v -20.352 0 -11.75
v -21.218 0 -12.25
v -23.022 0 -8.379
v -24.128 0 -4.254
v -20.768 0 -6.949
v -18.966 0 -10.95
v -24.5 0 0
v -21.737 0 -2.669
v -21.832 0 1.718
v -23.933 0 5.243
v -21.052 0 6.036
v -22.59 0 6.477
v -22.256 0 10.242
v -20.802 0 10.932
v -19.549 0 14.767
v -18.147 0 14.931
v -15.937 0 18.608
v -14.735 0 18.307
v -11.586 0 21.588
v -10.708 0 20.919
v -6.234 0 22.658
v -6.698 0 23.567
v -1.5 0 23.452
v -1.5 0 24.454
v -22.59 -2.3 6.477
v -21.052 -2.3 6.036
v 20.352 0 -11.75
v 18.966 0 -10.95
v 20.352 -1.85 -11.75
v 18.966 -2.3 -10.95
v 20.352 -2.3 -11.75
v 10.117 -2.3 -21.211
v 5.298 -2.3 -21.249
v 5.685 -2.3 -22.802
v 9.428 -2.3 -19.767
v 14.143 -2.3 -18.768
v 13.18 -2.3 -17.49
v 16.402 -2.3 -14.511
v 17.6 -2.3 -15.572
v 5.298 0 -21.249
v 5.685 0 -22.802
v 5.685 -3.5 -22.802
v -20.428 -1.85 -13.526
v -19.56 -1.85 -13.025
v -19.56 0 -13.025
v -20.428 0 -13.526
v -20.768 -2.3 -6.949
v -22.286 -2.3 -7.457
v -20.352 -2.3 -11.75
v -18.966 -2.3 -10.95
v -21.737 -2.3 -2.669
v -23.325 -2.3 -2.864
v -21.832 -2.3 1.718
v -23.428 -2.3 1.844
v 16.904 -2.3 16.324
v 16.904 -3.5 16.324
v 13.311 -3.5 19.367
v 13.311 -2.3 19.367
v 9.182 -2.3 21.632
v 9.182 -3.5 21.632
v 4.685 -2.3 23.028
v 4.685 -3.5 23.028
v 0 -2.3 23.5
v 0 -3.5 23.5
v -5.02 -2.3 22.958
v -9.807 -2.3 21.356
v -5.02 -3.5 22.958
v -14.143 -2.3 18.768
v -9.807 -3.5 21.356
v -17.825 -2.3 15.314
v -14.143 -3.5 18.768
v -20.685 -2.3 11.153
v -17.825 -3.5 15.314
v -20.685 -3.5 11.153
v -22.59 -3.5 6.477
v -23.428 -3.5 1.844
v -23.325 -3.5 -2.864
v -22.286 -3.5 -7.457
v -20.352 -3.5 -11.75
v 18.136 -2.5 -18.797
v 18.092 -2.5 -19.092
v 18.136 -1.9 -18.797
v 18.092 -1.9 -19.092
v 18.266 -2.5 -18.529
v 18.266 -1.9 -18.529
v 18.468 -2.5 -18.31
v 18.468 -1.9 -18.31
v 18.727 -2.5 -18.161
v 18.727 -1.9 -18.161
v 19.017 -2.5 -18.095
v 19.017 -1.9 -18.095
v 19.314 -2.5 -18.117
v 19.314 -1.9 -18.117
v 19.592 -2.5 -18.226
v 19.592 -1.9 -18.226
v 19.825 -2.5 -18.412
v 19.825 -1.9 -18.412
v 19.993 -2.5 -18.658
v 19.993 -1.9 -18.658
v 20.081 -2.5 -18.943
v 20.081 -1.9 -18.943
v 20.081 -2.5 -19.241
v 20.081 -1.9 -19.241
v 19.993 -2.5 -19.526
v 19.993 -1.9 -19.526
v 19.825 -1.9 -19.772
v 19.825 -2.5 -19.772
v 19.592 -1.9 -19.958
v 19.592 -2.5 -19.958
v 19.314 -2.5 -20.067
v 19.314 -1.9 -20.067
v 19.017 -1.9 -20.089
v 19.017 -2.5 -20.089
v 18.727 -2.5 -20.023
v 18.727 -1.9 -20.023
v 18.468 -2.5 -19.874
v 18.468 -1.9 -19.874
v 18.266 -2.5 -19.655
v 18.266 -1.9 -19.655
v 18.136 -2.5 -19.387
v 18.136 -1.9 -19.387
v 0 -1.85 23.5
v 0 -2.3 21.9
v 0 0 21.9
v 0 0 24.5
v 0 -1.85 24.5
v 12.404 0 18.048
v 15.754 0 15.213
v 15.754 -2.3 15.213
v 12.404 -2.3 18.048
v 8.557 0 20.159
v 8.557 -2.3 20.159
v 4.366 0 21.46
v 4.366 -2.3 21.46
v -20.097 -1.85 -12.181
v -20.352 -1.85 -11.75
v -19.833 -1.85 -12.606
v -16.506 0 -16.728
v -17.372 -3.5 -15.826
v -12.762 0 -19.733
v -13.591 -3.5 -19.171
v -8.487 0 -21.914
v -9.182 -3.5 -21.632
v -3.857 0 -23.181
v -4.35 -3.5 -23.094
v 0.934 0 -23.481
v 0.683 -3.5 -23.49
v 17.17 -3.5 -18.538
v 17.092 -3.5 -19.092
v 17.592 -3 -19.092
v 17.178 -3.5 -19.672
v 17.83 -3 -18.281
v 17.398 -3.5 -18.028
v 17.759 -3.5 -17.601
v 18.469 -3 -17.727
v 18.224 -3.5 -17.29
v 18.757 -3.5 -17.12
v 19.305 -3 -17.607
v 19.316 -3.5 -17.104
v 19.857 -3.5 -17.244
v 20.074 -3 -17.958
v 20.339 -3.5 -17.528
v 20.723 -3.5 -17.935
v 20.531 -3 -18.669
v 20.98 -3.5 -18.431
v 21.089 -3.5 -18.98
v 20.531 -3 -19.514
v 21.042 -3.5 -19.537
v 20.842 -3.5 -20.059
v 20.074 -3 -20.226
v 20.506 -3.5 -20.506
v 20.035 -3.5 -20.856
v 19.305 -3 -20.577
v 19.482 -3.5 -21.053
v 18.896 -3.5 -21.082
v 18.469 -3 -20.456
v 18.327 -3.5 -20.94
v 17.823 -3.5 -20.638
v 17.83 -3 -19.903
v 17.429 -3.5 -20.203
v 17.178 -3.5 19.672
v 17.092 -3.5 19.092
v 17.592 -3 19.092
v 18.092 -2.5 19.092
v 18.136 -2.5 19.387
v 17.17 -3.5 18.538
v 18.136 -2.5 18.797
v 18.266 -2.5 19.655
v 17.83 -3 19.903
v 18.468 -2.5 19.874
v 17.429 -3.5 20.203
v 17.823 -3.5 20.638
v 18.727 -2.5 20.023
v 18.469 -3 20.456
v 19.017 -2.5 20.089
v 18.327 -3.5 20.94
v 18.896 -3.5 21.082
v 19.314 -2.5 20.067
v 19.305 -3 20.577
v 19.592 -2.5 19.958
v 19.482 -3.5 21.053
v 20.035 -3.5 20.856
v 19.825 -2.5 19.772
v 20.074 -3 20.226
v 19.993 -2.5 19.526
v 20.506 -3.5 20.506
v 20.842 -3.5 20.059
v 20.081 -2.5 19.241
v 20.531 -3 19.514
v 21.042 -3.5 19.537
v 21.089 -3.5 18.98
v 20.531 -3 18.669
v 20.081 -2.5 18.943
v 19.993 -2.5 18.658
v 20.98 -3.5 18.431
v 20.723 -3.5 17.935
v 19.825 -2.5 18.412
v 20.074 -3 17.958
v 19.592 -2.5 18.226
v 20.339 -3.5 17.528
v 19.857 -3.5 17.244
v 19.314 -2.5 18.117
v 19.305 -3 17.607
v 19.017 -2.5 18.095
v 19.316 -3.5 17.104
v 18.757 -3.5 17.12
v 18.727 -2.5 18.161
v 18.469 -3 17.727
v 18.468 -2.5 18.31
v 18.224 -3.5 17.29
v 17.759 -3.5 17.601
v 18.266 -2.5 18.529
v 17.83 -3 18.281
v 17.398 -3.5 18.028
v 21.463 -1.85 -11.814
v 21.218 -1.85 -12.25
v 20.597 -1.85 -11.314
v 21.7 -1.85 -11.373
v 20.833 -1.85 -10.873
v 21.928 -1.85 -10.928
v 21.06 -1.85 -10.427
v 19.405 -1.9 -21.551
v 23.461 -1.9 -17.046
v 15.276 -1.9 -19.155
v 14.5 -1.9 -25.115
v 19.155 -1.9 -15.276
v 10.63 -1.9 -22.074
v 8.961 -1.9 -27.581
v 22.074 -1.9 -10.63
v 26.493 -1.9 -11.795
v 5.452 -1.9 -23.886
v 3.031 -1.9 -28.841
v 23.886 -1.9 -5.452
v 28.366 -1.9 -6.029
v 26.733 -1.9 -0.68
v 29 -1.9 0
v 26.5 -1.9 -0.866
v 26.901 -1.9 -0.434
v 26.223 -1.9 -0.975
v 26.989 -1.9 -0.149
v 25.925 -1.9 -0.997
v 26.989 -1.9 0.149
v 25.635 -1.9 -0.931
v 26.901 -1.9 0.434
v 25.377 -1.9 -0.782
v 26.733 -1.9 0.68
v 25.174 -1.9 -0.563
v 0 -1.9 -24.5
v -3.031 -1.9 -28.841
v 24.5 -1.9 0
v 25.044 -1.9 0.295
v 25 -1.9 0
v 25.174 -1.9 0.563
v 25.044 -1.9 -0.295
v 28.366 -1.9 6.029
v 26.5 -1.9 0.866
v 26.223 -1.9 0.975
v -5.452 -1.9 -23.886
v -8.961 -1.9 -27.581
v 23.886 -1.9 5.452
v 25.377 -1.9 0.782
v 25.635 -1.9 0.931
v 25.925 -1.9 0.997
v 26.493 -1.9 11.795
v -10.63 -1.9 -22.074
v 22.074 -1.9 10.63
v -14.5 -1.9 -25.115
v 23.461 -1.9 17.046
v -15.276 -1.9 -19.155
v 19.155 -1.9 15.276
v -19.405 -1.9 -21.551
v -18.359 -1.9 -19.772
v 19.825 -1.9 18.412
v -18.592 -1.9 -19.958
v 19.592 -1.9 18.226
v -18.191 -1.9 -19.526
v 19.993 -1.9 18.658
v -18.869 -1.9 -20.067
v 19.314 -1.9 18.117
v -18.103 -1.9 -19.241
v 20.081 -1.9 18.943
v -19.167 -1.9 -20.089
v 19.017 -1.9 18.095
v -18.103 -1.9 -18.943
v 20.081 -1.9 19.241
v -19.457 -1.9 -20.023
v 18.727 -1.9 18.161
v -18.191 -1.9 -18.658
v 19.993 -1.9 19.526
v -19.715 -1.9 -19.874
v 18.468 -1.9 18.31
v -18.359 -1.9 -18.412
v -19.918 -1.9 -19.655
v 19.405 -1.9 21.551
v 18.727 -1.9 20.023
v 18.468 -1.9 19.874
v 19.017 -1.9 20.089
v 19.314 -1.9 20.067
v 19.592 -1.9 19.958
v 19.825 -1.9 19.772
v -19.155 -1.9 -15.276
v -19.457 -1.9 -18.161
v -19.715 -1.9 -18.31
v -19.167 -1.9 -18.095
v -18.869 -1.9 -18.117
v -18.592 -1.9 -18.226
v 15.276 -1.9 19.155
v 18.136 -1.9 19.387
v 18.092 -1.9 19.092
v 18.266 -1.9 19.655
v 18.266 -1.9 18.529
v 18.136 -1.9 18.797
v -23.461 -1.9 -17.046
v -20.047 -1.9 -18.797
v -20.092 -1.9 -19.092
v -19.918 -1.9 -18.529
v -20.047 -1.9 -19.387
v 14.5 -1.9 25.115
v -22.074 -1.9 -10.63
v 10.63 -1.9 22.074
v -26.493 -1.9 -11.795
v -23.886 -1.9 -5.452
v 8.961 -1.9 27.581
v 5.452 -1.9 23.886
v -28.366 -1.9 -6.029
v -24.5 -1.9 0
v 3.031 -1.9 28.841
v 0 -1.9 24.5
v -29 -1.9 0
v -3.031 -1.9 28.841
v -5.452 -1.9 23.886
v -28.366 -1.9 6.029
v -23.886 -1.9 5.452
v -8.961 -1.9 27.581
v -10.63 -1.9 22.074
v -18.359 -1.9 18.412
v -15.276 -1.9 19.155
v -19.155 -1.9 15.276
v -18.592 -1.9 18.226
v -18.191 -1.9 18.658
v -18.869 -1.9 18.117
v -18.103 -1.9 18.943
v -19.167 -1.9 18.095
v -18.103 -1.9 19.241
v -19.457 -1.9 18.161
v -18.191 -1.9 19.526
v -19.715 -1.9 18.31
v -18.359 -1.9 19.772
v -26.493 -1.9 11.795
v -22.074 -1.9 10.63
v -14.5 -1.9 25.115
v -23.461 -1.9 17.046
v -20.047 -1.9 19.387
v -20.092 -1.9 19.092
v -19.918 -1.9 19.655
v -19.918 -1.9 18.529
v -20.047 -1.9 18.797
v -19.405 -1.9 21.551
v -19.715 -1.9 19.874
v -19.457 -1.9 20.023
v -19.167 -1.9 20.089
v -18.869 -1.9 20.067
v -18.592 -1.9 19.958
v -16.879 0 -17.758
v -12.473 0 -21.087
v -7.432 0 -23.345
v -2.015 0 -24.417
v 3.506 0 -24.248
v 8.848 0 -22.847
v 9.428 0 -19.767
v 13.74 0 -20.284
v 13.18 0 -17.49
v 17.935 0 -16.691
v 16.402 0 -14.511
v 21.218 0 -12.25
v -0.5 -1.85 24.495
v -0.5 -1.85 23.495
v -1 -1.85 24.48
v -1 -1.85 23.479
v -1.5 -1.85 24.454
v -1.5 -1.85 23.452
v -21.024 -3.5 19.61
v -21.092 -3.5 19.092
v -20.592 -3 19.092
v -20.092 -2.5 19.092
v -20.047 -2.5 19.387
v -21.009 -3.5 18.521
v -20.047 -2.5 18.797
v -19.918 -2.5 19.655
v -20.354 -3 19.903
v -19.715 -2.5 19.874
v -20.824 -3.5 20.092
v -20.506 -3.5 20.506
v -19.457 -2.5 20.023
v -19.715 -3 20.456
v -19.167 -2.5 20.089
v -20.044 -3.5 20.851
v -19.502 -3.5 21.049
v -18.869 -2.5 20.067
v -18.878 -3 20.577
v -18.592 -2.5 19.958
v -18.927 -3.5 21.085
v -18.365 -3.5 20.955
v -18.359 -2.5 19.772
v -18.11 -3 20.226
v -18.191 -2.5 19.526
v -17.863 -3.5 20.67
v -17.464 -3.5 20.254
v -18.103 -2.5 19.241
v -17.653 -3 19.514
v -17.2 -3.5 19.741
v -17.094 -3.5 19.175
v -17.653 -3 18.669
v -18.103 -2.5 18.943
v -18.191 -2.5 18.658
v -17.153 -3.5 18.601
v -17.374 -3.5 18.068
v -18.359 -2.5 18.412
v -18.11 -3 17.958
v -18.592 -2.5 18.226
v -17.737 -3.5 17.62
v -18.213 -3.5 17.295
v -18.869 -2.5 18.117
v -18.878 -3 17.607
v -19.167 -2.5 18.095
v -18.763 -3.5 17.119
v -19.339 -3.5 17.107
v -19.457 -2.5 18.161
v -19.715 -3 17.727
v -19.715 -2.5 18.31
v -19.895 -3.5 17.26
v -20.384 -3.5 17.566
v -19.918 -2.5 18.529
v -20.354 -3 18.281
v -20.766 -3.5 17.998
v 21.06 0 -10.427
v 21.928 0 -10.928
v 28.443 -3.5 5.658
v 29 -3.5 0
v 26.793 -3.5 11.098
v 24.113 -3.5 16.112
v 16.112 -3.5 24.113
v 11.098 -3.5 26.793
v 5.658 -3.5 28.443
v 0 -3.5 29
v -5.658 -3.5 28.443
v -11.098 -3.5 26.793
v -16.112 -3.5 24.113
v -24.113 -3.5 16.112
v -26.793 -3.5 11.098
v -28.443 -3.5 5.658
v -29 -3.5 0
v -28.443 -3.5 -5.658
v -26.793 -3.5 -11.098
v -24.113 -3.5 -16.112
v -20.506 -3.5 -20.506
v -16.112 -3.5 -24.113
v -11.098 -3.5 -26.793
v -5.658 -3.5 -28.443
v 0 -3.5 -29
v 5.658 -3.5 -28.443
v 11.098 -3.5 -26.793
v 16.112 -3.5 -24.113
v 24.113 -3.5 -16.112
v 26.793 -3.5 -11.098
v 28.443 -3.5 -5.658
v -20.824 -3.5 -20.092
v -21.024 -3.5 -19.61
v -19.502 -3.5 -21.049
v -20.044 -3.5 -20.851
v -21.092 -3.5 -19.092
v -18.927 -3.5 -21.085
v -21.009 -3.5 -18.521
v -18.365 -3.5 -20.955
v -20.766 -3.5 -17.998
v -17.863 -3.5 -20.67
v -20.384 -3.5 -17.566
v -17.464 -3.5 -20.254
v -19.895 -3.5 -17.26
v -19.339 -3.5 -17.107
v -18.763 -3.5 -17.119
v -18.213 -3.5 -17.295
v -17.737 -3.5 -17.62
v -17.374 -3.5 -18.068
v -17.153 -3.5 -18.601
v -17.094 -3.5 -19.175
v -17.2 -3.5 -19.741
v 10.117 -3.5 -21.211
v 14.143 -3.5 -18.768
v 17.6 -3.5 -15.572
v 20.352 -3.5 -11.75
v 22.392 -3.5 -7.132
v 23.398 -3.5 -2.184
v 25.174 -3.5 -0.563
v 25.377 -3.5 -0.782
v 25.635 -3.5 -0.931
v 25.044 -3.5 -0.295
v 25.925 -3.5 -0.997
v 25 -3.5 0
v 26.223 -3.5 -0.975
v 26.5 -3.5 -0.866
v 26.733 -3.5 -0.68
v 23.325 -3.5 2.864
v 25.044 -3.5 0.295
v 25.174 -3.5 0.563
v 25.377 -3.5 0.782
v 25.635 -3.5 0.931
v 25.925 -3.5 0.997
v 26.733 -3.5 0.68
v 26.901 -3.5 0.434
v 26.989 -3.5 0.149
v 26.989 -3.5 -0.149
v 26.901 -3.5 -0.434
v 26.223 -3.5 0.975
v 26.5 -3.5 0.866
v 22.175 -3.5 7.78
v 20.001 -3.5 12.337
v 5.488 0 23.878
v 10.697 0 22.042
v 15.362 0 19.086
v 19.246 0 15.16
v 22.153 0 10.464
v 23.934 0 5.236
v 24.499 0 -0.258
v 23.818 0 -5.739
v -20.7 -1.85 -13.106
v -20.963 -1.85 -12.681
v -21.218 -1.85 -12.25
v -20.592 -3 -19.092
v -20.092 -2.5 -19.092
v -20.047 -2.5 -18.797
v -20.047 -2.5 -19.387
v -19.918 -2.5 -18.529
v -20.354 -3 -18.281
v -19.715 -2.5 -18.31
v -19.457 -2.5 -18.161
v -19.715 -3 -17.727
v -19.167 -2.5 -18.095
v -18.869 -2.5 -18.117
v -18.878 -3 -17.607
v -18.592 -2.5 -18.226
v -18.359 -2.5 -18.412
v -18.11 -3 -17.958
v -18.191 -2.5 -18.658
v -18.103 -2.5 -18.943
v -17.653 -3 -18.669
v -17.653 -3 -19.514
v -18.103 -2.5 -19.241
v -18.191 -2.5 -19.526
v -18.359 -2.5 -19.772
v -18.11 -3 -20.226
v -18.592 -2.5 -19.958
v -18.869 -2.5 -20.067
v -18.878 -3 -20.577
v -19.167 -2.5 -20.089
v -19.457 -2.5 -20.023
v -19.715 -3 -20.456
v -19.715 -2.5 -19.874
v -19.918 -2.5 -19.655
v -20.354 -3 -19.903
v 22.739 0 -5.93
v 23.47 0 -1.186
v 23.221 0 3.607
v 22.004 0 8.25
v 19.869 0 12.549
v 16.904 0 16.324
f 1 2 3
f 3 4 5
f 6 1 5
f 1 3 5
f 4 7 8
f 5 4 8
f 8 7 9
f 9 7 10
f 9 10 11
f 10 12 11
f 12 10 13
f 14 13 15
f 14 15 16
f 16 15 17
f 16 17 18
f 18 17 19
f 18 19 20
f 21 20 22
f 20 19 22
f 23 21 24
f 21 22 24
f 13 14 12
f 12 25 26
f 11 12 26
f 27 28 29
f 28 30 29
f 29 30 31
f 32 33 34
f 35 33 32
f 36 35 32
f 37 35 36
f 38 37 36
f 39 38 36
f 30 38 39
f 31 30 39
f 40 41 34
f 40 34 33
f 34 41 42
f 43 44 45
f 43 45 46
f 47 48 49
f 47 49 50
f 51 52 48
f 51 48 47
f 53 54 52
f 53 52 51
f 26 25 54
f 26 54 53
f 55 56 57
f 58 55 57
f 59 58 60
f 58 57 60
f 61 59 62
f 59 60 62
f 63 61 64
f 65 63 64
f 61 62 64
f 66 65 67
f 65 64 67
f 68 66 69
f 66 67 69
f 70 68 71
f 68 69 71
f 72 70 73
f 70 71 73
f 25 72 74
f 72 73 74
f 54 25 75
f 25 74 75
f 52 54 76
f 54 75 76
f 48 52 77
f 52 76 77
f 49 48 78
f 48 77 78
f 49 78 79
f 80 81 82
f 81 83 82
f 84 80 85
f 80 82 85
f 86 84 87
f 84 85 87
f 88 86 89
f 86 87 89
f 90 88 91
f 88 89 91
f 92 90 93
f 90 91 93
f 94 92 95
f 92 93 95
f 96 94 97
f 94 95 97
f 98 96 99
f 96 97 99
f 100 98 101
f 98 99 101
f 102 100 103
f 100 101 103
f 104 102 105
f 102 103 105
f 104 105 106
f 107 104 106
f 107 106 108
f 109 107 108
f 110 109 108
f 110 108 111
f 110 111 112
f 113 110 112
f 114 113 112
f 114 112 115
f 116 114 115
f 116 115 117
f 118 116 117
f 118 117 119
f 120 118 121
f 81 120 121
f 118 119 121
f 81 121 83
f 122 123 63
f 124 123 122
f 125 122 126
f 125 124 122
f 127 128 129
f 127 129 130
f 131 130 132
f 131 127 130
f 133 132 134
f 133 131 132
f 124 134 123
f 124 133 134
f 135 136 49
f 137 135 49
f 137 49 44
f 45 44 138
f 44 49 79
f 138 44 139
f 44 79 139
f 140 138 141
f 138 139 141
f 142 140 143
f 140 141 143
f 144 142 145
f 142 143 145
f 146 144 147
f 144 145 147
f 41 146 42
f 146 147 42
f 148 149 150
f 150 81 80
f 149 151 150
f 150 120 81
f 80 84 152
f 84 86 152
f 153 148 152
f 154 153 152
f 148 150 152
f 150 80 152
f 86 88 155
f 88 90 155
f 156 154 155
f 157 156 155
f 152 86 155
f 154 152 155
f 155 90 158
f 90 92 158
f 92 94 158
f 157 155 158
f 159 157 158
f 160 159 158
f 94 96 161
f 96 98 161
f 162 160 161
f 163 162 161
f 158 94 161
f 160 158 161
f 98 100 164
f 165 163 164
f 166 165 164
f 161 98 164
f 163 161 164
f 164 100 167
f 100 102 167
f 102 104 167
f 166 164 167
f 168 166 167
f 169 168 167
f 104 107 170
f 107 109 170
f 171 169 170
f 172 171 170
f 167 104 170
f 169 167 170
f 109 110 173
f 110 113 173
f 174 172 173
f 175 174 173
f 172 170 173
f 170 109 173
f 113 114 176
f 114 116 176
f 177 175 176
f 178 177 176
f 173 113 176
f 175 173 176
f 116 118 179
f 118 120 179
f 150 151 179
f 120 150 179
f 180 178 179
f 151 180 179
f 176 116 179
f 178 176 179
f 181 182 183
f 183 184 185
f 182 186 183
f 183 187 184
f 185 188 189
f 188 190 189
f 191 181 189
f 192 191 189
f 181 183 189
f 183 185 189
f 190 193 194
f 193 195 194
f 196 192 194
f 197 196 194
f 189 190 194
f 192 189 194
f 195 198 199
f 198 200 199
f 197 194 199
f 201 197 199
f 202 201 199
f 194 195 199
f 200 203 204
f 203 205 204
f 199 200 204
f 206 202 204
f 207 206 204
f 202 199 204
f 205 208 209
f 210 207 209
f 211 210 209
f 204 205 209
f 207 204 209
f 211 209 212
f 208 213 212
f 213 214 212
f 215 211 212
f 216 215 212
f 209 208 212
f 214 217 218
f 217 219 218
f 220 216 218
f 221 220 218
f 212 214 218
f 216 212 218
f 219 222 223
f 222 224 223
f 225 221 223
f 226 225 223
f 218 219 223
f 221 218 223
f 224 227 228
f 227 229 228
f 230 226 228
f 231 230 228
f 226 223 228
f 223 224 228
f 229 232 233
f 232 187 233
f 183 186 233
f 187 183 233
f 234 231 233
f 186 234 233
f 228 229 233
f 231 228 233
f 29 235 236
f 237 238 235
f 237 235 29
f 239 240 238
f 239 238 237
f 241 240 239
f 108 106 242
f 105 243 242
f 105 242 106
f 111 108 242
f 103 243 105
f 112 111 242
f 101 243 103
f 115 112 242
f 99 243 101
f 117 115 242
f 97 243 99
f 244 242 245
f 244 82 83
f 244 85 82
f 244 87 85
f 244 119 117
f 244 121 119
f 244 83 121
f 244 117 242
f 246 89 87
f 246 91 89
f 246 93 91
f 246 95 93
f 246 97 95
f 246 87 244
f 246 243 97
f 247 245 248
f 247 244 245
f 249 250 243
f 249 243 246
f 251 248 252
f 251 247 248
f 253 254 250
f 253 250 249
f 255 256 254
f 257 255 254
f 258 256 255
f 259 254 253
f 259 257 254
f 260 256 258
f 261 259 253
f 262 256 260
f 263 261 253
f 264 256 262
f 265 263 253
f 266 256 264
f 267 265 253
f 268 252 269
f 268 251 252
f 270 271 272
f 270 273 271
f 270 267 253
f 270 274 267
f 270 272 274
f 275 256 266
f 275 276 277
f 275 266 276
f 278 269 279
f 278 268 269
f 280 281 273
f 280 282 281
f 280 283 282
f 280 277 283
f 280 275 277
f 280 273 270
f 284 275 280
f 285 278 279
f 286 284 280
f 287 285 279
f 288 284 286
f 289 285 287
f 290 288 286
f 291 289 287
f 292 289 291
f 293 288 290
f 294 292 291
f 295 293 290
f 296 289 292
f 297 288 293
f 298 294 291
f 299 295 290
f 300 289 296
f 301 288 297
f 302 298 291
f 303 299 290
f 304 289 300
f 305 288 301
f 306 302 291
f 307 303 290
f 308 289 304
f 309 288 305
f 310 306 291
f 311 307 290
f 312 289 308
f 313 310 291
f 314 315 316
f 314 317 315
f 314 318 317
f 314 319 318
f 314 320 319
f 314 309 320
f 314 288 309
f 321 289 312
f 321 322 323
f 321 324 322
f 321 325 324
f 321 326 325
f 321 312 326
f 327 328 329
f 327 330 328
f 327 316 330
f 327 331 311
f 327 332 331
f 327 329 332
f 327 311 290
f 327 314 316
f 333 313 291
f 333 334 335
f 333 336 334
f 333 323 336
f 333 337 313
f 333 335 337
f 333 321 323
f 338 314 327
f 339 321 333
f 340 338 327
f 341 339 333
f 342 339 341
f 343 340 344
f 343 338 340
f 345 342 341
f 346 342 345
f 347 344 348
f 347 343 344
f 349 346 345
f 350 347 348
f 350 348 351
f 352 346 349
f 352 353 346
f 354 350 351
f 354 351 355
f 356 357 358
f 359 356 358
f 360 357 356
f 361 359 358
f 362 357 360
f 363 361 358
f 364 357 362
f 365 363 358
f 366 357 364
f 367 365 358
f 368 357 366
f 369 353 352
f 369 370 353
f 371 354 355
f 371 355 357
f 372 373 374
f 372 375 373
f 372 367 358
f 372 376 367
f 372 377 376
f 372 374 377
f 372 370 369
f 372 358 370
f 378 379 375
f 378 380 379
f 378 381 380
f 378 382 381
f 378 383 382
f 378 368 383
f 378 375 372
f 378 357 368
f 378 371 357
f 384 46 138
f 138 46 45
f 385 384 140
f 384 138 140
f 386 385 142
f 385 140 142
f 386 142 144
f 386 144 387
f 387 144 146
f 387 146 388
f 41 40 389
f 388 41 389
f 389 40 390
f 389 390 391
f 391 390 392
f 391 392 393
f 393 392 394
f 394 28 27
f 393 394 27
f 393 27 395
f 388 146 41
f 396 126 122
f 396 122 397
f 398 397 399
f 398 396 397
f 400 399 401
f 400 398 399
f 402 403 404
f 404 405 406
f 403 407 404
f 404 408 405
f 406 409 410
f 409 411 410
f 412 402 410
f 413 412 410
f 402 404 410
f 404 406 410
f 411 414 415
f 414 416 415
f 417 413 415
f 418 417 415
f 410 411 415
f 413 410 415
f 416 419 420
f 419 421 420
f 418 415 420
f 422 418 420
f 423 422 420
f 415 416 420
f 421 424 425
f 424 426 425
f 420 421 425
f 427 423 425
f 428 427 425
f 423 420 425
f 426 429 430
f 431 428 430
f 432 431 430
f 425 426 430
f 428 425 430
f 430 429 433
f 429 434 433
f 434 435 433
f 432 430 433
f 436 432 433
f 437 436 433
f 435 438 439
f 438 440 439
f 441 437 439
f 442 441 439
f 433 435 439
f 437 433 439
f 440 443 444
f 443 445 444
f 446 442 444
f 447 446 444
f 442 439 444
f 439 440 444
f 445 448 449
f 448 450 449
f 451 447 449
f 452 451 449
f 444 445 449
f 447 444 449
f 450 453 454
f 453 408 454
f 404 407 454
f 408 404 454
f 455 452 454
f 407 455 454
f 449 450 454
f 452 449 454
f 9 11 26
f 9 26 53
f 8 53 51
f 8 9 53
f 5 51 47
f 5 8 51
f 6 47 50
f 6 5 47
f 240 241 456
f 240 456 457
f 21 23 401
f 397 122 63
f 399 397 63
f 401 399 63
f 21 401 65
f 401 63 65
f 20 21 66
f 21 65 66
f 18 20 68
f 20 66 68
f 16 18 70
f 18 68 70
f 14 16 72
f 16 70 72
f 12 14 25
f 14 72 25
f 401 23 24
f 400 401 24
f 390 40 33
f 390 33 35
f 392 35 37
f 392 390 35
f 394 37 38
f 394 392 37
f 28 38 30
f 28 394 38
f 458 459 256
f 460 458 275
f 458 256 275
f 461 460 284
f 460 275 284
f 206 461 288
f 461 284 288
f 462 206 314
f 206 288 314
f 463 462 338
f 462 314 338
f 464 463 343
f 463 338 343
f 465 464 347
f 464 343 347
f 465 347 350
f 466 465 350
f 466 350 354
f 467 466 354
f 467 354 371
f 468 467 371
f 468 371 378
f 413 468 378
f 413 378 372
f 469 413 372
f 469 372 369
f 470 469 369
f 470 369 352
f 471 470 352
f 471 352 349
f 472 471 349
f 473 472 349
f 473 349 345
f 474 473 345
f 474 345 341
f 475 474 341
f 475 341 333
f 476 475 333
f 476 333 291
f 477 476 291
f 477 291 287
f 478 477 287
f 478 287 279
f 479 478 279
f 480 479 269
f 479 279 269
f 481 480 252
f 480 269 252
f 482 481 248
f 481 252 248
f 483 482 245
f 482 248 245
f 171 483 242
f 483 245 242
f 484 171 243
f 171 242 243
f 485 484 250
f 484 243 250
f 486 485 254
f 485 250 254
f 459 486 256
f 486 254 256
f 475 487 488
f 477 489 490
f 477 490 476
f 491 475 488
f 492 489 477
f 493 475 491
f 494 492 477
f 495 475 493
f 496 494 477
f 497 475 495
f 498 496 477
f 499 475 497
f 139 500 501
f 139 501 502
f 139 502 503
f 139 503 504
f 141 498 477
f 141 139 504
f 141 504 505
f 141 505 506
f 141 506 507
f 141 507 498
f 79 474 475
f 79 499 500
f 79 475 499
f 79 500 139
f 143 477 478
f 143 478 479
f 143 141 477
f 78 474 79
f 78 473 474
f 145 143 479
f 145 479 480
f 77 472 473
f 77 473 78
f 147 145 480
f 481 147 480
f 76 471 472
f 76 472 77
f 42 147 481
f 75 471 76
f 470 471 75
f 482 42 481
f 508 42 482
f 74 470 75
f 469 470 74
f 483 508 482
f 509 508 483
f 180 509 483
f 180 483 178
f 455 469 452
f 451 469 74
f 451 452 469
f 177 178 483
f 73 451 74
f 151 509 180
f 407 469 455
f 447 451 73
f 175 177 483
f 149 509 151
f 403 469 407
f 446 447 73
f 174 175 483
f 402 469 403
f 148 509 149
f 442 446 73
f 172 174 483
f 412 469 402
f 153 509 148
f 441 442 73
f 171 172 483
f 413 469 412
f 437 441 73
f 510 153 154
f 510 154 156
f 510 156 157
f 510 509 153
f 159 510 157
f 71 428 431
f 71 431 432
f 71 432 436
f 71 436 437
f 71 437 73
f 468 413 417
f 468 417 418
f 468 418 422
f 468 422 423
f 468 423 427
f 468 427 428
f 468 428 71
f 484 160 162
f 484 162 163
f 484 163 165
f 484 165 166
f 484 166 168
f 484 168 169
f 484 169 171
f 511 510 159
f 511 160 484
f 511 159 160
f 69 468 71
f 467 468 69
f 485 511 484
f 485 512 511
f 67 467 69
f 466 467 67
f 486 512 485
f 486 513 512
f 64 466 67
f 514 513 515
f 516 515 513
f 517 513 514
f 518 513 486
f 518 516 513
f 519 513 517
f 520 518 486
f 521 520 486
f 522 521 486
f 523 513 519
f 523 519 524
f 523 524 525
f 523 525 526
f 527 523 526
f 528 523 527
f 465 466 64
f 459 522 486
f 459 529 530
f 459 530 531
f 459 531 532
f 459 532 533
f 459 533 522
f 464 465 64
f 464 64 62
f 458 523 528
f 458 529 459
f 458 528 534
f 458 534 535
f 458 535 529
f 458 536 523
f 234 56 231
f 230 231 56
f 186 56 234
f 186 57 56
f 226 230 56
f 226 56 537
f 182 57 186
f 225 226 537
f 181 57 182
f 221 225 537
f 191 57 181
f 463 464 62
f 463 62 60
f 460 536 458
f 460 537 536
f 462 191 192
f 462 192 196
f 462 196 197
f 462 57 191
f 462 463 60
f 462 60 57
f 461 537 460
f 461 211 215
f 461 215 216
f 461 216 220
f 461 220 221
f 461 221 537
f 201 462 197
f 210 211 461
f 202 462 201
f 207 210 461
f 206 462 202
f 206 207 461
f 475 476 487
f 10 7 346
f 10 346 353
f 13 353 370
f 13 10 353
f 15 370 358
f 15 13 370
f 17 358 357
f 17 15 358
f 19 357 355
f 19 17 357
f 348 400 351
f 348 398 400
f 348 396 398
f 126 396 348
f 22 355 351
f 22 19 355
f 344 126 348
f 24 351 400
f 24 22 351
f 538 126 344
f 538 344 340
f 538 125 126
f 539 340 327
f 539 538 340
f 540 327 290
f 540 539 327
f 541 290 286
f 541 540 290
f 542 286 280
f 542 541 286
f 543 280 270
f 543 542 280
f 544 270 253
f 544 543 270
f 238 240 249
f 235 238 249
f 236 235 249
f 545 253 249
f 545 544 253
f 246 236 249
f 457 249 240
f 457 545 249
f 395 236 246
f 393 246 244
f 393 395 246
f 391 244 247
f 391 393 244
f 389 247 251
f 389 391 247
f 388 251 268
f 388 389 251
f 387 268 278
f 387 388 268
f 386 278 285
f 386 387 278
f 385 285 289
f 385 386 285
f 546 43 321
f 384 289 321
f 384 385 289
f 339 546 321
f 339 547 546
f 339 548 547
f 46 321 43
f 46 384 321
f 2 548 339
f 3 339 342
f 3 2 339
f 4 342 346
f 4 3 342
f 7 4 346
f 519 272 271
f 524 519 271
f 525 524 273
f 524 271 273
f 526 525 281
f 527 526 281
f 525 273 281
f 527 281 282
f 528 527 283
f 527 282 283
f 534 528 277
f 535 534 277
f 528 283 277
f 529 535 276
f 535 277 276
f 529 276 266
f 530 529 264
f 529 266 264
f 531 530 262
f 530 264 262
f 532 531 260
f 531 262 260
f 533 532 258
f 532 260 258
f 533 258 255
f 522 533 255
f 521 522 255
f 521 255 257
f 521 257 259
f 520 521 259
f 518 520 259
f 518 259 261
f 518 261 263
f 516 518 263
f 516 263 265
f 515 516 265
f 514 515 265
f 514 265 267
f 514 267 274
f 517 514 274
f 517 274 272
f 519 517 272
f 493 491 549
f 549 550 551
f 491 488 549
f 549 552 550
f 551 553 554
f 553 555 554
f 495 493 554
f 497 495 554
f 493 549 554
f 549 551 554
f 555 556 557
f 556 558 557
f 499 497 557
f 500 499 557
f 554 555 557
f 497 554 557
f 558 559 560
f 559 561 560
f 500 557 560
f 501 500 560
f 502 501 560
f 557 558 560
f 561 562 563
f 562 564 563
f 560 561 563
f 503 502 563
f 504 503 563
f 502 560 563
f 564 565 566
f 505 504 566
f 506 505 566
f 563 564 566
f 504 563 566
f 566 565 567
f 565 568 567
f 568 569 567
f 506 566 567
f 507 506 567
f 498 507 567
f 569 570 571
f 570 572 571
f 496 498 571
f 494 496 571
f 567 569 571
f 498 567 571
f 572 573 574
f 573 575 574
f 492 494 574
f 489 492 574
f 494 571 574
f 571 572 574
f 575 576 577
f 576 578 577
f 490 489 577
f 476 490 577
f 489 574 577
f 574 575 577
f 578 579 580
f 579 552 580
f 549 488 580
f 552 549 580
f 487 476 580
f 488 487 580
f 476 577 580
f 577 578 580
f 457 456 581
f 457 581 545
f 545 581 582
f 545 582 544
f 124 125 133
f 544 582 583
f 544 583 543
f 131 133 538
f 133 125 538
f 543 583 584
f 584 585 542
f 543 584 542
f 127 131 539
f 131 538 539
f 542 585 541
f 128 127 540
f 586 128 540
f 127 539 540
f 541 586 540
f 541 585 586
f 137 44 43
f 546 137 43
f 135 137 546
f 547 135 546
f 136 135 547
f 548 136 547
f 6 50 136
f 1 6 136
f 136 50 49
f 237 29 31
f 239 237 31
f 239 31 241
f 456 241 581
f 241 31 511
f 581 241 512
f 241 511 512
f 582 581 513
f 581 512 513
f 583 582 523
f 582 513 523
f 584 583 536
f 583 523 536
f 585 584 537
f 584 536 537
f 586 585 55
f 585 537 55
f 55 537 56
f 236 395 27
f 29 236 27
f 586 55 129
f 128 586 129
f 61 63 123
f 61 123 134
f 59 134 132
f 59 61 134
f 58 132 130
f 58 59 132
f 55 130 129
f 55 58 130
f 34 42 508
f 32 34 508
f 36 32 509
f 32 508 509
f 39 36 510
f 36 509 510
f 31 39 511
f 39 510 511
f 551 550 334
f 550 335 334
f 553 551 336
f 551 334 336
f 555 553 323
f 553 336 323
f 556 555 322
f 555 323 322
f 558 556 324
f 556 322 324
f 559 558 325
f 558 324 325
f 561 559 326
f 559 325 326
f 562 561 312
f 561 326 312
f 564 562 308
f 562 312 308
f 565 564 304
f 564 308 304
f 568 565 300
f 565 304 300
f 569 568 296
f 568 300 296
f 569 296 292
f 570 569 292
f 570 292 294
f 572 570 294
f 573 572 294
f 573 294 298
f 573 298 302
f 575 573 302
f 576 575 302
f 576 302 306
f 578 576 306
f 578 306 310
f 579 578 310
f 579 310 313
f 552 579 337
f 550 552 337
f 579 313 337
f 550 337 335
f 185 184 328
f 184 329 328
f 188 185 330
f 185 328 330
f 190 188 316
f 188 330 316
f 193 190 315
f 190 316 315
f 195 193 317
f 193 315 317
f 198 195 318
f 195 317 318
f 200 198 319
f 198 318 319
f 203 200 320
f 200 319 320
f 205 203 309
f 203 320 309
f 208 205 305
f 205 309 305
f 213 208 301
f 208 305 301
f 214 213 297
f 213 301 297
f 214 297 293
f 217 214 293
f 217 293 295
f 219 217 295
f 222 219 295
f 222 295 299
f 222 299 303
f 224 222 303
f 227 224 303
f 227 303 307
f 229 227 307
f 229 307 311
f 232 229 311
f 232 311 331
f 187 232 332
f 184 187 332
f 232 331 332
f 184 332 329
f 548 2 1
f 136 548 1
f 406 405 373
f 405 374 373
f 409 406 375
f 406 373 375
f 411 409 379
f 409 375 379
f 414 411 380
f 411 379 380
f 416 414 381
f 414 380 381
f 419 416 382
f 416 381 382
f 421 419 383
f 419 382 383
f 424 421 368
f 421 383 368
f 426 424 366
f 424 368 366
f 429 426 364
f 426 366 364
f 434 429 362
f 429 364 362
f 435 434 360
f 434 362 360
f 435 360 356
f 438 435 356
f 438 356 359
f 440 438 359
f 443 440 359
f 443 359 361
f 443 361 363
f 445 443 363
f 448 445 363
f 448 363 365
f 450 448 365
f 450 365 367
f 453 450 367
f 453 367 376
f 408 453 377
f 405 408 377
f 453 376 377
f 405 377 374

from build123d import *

# Parameters (mm, degrees)
F0_R            = 29
F0_R_2          = 21.9
F1_DEPTH        = 3.5
F2_R            = 23.5
F3_DEPTH        = 1.2
F5_DEPTH        = 3.501
F6_R            = 30.5
F6_R_2          = 24.5
F7_DEPTH        = 1.9
F8_W            = 1.5
F8_H            = 25
F9_DEPTH        = 1.85
F11_D           = 2
F13_D           = 2
F13_DEPTH       = 10
F13_CSINK_D     = 4
F13_CSINK_ANGLE = 90


with BuildPart() as f1:
    # F0 (on Front) → F1 (new body)
    with BuildSketch(Plane.XZ):
        Circle(F0_R)
        Circle(F0_R_2, mode=Mode.SUBTRACT)
    extrude(amount=F1_DEPTH)

    # F2 (on face) → F3 (cut)
    with BuildSketch(Plane.XZ.offset(3.5)):
        Circle(F2_R)
    extrude(amount=-F3_DEPTH, mode=Mode.SUBTRACT)

    # F4 (on face) → F5 (cut, through all)
    with BuildSketch(Plane.XZ.offset(3.5)):
        with BuildLine():
            Line((0, 21.9), (0, 23.5))
            ThreePointArc((0, 23.5), (-14.142653, 18.767934), (-22.58965, 6.477478))
            Line((-22.58965, 6.477478), (-21.051631, 6.036458))
            ThreePointArc((-21.051631, 6.036458), (-21.736761, -2.668939), (-18.965956, -10.95))
            Line((-18.965956, -10.95), (-20.351597, -11.75))
            ThreePointArc((-20.351597, -11.75), (-9.182182, -21.631864), (5.685165, -22.80195))
            Line((5.685165, -22.80195), (5.29809, -21.249476))
            ThreePointArc((5.29809, -21.249476), (13.179749, -17.490118), (18.965956, -10.95))
            Line((18.965956, -10.95), (20.351597, -11.75))
            ThreePointArc((20.351597, -11.75), (23.324835, 2.86393), (16.904485, 16.324472))
            Line((16.904485, 16.324472), (15.753542, 15.213018))
            ThreePointArc((15.753542, 15.213018), (8.557012, 20.159056), (0, 21.9))
        make_face()
    extrude(amount=-F5_DEPTH, mode=Mode.SUBTRACT)

    # F6 (on face) → F7 (cut)
    with BuildSketch(Plane(origin=(0, 0, 0), x_dir=(-1, 0, 0), z_dir=(0, 1, 0))):
        Circle(F6_R)
        Circle(F6_R_2, mode=Mode.SUBTRACT)
    extrude(amount=-F7_DEPTH, mode=Mode.SUBTRACT)

    # F8 (on face) → F9 (cut)
    with BuildSketch(Plane(origin=(0, 0, 0), x_dir=(-1, 0, 0), z_dir=(0, 1, 0))):
        Polygon((21.650635, -12.5), (0, 0), (-0.75, -1.299038), (20.900635, -13.799038), align=None)
        with Locations((0.75, 12.5)):
            Rectangle(F8_W, F8_H)
        Polygon((-21.650635, -12.5), (0, 0), (-0.75, 1.299038), (-22.400635, -11.200962), align=None)
    extrude(amount=-F9_DEPTH, mode=Mode.SUBTRACT)

    # F11 (through all)
    with Locations(Plane.XZ.offset(3.5)):
        with Locations((26, 0)):
            Hole(F11_D / 2)

    # F13
    with Locations(Plane.XZ.offset(3.5)):
        with Locations((-19.091883, 19.091883), (19.091883, 19.091883), (19.091883, -19.091883), (-19.091883, -19.091883)):
            CounterSinkHole(F13_D / 2, F13_CSINK_D / 2, depth=F13_DEPTH, counter_sink_angle=F13_CSINK_ANGLE)


solid = f1.part
